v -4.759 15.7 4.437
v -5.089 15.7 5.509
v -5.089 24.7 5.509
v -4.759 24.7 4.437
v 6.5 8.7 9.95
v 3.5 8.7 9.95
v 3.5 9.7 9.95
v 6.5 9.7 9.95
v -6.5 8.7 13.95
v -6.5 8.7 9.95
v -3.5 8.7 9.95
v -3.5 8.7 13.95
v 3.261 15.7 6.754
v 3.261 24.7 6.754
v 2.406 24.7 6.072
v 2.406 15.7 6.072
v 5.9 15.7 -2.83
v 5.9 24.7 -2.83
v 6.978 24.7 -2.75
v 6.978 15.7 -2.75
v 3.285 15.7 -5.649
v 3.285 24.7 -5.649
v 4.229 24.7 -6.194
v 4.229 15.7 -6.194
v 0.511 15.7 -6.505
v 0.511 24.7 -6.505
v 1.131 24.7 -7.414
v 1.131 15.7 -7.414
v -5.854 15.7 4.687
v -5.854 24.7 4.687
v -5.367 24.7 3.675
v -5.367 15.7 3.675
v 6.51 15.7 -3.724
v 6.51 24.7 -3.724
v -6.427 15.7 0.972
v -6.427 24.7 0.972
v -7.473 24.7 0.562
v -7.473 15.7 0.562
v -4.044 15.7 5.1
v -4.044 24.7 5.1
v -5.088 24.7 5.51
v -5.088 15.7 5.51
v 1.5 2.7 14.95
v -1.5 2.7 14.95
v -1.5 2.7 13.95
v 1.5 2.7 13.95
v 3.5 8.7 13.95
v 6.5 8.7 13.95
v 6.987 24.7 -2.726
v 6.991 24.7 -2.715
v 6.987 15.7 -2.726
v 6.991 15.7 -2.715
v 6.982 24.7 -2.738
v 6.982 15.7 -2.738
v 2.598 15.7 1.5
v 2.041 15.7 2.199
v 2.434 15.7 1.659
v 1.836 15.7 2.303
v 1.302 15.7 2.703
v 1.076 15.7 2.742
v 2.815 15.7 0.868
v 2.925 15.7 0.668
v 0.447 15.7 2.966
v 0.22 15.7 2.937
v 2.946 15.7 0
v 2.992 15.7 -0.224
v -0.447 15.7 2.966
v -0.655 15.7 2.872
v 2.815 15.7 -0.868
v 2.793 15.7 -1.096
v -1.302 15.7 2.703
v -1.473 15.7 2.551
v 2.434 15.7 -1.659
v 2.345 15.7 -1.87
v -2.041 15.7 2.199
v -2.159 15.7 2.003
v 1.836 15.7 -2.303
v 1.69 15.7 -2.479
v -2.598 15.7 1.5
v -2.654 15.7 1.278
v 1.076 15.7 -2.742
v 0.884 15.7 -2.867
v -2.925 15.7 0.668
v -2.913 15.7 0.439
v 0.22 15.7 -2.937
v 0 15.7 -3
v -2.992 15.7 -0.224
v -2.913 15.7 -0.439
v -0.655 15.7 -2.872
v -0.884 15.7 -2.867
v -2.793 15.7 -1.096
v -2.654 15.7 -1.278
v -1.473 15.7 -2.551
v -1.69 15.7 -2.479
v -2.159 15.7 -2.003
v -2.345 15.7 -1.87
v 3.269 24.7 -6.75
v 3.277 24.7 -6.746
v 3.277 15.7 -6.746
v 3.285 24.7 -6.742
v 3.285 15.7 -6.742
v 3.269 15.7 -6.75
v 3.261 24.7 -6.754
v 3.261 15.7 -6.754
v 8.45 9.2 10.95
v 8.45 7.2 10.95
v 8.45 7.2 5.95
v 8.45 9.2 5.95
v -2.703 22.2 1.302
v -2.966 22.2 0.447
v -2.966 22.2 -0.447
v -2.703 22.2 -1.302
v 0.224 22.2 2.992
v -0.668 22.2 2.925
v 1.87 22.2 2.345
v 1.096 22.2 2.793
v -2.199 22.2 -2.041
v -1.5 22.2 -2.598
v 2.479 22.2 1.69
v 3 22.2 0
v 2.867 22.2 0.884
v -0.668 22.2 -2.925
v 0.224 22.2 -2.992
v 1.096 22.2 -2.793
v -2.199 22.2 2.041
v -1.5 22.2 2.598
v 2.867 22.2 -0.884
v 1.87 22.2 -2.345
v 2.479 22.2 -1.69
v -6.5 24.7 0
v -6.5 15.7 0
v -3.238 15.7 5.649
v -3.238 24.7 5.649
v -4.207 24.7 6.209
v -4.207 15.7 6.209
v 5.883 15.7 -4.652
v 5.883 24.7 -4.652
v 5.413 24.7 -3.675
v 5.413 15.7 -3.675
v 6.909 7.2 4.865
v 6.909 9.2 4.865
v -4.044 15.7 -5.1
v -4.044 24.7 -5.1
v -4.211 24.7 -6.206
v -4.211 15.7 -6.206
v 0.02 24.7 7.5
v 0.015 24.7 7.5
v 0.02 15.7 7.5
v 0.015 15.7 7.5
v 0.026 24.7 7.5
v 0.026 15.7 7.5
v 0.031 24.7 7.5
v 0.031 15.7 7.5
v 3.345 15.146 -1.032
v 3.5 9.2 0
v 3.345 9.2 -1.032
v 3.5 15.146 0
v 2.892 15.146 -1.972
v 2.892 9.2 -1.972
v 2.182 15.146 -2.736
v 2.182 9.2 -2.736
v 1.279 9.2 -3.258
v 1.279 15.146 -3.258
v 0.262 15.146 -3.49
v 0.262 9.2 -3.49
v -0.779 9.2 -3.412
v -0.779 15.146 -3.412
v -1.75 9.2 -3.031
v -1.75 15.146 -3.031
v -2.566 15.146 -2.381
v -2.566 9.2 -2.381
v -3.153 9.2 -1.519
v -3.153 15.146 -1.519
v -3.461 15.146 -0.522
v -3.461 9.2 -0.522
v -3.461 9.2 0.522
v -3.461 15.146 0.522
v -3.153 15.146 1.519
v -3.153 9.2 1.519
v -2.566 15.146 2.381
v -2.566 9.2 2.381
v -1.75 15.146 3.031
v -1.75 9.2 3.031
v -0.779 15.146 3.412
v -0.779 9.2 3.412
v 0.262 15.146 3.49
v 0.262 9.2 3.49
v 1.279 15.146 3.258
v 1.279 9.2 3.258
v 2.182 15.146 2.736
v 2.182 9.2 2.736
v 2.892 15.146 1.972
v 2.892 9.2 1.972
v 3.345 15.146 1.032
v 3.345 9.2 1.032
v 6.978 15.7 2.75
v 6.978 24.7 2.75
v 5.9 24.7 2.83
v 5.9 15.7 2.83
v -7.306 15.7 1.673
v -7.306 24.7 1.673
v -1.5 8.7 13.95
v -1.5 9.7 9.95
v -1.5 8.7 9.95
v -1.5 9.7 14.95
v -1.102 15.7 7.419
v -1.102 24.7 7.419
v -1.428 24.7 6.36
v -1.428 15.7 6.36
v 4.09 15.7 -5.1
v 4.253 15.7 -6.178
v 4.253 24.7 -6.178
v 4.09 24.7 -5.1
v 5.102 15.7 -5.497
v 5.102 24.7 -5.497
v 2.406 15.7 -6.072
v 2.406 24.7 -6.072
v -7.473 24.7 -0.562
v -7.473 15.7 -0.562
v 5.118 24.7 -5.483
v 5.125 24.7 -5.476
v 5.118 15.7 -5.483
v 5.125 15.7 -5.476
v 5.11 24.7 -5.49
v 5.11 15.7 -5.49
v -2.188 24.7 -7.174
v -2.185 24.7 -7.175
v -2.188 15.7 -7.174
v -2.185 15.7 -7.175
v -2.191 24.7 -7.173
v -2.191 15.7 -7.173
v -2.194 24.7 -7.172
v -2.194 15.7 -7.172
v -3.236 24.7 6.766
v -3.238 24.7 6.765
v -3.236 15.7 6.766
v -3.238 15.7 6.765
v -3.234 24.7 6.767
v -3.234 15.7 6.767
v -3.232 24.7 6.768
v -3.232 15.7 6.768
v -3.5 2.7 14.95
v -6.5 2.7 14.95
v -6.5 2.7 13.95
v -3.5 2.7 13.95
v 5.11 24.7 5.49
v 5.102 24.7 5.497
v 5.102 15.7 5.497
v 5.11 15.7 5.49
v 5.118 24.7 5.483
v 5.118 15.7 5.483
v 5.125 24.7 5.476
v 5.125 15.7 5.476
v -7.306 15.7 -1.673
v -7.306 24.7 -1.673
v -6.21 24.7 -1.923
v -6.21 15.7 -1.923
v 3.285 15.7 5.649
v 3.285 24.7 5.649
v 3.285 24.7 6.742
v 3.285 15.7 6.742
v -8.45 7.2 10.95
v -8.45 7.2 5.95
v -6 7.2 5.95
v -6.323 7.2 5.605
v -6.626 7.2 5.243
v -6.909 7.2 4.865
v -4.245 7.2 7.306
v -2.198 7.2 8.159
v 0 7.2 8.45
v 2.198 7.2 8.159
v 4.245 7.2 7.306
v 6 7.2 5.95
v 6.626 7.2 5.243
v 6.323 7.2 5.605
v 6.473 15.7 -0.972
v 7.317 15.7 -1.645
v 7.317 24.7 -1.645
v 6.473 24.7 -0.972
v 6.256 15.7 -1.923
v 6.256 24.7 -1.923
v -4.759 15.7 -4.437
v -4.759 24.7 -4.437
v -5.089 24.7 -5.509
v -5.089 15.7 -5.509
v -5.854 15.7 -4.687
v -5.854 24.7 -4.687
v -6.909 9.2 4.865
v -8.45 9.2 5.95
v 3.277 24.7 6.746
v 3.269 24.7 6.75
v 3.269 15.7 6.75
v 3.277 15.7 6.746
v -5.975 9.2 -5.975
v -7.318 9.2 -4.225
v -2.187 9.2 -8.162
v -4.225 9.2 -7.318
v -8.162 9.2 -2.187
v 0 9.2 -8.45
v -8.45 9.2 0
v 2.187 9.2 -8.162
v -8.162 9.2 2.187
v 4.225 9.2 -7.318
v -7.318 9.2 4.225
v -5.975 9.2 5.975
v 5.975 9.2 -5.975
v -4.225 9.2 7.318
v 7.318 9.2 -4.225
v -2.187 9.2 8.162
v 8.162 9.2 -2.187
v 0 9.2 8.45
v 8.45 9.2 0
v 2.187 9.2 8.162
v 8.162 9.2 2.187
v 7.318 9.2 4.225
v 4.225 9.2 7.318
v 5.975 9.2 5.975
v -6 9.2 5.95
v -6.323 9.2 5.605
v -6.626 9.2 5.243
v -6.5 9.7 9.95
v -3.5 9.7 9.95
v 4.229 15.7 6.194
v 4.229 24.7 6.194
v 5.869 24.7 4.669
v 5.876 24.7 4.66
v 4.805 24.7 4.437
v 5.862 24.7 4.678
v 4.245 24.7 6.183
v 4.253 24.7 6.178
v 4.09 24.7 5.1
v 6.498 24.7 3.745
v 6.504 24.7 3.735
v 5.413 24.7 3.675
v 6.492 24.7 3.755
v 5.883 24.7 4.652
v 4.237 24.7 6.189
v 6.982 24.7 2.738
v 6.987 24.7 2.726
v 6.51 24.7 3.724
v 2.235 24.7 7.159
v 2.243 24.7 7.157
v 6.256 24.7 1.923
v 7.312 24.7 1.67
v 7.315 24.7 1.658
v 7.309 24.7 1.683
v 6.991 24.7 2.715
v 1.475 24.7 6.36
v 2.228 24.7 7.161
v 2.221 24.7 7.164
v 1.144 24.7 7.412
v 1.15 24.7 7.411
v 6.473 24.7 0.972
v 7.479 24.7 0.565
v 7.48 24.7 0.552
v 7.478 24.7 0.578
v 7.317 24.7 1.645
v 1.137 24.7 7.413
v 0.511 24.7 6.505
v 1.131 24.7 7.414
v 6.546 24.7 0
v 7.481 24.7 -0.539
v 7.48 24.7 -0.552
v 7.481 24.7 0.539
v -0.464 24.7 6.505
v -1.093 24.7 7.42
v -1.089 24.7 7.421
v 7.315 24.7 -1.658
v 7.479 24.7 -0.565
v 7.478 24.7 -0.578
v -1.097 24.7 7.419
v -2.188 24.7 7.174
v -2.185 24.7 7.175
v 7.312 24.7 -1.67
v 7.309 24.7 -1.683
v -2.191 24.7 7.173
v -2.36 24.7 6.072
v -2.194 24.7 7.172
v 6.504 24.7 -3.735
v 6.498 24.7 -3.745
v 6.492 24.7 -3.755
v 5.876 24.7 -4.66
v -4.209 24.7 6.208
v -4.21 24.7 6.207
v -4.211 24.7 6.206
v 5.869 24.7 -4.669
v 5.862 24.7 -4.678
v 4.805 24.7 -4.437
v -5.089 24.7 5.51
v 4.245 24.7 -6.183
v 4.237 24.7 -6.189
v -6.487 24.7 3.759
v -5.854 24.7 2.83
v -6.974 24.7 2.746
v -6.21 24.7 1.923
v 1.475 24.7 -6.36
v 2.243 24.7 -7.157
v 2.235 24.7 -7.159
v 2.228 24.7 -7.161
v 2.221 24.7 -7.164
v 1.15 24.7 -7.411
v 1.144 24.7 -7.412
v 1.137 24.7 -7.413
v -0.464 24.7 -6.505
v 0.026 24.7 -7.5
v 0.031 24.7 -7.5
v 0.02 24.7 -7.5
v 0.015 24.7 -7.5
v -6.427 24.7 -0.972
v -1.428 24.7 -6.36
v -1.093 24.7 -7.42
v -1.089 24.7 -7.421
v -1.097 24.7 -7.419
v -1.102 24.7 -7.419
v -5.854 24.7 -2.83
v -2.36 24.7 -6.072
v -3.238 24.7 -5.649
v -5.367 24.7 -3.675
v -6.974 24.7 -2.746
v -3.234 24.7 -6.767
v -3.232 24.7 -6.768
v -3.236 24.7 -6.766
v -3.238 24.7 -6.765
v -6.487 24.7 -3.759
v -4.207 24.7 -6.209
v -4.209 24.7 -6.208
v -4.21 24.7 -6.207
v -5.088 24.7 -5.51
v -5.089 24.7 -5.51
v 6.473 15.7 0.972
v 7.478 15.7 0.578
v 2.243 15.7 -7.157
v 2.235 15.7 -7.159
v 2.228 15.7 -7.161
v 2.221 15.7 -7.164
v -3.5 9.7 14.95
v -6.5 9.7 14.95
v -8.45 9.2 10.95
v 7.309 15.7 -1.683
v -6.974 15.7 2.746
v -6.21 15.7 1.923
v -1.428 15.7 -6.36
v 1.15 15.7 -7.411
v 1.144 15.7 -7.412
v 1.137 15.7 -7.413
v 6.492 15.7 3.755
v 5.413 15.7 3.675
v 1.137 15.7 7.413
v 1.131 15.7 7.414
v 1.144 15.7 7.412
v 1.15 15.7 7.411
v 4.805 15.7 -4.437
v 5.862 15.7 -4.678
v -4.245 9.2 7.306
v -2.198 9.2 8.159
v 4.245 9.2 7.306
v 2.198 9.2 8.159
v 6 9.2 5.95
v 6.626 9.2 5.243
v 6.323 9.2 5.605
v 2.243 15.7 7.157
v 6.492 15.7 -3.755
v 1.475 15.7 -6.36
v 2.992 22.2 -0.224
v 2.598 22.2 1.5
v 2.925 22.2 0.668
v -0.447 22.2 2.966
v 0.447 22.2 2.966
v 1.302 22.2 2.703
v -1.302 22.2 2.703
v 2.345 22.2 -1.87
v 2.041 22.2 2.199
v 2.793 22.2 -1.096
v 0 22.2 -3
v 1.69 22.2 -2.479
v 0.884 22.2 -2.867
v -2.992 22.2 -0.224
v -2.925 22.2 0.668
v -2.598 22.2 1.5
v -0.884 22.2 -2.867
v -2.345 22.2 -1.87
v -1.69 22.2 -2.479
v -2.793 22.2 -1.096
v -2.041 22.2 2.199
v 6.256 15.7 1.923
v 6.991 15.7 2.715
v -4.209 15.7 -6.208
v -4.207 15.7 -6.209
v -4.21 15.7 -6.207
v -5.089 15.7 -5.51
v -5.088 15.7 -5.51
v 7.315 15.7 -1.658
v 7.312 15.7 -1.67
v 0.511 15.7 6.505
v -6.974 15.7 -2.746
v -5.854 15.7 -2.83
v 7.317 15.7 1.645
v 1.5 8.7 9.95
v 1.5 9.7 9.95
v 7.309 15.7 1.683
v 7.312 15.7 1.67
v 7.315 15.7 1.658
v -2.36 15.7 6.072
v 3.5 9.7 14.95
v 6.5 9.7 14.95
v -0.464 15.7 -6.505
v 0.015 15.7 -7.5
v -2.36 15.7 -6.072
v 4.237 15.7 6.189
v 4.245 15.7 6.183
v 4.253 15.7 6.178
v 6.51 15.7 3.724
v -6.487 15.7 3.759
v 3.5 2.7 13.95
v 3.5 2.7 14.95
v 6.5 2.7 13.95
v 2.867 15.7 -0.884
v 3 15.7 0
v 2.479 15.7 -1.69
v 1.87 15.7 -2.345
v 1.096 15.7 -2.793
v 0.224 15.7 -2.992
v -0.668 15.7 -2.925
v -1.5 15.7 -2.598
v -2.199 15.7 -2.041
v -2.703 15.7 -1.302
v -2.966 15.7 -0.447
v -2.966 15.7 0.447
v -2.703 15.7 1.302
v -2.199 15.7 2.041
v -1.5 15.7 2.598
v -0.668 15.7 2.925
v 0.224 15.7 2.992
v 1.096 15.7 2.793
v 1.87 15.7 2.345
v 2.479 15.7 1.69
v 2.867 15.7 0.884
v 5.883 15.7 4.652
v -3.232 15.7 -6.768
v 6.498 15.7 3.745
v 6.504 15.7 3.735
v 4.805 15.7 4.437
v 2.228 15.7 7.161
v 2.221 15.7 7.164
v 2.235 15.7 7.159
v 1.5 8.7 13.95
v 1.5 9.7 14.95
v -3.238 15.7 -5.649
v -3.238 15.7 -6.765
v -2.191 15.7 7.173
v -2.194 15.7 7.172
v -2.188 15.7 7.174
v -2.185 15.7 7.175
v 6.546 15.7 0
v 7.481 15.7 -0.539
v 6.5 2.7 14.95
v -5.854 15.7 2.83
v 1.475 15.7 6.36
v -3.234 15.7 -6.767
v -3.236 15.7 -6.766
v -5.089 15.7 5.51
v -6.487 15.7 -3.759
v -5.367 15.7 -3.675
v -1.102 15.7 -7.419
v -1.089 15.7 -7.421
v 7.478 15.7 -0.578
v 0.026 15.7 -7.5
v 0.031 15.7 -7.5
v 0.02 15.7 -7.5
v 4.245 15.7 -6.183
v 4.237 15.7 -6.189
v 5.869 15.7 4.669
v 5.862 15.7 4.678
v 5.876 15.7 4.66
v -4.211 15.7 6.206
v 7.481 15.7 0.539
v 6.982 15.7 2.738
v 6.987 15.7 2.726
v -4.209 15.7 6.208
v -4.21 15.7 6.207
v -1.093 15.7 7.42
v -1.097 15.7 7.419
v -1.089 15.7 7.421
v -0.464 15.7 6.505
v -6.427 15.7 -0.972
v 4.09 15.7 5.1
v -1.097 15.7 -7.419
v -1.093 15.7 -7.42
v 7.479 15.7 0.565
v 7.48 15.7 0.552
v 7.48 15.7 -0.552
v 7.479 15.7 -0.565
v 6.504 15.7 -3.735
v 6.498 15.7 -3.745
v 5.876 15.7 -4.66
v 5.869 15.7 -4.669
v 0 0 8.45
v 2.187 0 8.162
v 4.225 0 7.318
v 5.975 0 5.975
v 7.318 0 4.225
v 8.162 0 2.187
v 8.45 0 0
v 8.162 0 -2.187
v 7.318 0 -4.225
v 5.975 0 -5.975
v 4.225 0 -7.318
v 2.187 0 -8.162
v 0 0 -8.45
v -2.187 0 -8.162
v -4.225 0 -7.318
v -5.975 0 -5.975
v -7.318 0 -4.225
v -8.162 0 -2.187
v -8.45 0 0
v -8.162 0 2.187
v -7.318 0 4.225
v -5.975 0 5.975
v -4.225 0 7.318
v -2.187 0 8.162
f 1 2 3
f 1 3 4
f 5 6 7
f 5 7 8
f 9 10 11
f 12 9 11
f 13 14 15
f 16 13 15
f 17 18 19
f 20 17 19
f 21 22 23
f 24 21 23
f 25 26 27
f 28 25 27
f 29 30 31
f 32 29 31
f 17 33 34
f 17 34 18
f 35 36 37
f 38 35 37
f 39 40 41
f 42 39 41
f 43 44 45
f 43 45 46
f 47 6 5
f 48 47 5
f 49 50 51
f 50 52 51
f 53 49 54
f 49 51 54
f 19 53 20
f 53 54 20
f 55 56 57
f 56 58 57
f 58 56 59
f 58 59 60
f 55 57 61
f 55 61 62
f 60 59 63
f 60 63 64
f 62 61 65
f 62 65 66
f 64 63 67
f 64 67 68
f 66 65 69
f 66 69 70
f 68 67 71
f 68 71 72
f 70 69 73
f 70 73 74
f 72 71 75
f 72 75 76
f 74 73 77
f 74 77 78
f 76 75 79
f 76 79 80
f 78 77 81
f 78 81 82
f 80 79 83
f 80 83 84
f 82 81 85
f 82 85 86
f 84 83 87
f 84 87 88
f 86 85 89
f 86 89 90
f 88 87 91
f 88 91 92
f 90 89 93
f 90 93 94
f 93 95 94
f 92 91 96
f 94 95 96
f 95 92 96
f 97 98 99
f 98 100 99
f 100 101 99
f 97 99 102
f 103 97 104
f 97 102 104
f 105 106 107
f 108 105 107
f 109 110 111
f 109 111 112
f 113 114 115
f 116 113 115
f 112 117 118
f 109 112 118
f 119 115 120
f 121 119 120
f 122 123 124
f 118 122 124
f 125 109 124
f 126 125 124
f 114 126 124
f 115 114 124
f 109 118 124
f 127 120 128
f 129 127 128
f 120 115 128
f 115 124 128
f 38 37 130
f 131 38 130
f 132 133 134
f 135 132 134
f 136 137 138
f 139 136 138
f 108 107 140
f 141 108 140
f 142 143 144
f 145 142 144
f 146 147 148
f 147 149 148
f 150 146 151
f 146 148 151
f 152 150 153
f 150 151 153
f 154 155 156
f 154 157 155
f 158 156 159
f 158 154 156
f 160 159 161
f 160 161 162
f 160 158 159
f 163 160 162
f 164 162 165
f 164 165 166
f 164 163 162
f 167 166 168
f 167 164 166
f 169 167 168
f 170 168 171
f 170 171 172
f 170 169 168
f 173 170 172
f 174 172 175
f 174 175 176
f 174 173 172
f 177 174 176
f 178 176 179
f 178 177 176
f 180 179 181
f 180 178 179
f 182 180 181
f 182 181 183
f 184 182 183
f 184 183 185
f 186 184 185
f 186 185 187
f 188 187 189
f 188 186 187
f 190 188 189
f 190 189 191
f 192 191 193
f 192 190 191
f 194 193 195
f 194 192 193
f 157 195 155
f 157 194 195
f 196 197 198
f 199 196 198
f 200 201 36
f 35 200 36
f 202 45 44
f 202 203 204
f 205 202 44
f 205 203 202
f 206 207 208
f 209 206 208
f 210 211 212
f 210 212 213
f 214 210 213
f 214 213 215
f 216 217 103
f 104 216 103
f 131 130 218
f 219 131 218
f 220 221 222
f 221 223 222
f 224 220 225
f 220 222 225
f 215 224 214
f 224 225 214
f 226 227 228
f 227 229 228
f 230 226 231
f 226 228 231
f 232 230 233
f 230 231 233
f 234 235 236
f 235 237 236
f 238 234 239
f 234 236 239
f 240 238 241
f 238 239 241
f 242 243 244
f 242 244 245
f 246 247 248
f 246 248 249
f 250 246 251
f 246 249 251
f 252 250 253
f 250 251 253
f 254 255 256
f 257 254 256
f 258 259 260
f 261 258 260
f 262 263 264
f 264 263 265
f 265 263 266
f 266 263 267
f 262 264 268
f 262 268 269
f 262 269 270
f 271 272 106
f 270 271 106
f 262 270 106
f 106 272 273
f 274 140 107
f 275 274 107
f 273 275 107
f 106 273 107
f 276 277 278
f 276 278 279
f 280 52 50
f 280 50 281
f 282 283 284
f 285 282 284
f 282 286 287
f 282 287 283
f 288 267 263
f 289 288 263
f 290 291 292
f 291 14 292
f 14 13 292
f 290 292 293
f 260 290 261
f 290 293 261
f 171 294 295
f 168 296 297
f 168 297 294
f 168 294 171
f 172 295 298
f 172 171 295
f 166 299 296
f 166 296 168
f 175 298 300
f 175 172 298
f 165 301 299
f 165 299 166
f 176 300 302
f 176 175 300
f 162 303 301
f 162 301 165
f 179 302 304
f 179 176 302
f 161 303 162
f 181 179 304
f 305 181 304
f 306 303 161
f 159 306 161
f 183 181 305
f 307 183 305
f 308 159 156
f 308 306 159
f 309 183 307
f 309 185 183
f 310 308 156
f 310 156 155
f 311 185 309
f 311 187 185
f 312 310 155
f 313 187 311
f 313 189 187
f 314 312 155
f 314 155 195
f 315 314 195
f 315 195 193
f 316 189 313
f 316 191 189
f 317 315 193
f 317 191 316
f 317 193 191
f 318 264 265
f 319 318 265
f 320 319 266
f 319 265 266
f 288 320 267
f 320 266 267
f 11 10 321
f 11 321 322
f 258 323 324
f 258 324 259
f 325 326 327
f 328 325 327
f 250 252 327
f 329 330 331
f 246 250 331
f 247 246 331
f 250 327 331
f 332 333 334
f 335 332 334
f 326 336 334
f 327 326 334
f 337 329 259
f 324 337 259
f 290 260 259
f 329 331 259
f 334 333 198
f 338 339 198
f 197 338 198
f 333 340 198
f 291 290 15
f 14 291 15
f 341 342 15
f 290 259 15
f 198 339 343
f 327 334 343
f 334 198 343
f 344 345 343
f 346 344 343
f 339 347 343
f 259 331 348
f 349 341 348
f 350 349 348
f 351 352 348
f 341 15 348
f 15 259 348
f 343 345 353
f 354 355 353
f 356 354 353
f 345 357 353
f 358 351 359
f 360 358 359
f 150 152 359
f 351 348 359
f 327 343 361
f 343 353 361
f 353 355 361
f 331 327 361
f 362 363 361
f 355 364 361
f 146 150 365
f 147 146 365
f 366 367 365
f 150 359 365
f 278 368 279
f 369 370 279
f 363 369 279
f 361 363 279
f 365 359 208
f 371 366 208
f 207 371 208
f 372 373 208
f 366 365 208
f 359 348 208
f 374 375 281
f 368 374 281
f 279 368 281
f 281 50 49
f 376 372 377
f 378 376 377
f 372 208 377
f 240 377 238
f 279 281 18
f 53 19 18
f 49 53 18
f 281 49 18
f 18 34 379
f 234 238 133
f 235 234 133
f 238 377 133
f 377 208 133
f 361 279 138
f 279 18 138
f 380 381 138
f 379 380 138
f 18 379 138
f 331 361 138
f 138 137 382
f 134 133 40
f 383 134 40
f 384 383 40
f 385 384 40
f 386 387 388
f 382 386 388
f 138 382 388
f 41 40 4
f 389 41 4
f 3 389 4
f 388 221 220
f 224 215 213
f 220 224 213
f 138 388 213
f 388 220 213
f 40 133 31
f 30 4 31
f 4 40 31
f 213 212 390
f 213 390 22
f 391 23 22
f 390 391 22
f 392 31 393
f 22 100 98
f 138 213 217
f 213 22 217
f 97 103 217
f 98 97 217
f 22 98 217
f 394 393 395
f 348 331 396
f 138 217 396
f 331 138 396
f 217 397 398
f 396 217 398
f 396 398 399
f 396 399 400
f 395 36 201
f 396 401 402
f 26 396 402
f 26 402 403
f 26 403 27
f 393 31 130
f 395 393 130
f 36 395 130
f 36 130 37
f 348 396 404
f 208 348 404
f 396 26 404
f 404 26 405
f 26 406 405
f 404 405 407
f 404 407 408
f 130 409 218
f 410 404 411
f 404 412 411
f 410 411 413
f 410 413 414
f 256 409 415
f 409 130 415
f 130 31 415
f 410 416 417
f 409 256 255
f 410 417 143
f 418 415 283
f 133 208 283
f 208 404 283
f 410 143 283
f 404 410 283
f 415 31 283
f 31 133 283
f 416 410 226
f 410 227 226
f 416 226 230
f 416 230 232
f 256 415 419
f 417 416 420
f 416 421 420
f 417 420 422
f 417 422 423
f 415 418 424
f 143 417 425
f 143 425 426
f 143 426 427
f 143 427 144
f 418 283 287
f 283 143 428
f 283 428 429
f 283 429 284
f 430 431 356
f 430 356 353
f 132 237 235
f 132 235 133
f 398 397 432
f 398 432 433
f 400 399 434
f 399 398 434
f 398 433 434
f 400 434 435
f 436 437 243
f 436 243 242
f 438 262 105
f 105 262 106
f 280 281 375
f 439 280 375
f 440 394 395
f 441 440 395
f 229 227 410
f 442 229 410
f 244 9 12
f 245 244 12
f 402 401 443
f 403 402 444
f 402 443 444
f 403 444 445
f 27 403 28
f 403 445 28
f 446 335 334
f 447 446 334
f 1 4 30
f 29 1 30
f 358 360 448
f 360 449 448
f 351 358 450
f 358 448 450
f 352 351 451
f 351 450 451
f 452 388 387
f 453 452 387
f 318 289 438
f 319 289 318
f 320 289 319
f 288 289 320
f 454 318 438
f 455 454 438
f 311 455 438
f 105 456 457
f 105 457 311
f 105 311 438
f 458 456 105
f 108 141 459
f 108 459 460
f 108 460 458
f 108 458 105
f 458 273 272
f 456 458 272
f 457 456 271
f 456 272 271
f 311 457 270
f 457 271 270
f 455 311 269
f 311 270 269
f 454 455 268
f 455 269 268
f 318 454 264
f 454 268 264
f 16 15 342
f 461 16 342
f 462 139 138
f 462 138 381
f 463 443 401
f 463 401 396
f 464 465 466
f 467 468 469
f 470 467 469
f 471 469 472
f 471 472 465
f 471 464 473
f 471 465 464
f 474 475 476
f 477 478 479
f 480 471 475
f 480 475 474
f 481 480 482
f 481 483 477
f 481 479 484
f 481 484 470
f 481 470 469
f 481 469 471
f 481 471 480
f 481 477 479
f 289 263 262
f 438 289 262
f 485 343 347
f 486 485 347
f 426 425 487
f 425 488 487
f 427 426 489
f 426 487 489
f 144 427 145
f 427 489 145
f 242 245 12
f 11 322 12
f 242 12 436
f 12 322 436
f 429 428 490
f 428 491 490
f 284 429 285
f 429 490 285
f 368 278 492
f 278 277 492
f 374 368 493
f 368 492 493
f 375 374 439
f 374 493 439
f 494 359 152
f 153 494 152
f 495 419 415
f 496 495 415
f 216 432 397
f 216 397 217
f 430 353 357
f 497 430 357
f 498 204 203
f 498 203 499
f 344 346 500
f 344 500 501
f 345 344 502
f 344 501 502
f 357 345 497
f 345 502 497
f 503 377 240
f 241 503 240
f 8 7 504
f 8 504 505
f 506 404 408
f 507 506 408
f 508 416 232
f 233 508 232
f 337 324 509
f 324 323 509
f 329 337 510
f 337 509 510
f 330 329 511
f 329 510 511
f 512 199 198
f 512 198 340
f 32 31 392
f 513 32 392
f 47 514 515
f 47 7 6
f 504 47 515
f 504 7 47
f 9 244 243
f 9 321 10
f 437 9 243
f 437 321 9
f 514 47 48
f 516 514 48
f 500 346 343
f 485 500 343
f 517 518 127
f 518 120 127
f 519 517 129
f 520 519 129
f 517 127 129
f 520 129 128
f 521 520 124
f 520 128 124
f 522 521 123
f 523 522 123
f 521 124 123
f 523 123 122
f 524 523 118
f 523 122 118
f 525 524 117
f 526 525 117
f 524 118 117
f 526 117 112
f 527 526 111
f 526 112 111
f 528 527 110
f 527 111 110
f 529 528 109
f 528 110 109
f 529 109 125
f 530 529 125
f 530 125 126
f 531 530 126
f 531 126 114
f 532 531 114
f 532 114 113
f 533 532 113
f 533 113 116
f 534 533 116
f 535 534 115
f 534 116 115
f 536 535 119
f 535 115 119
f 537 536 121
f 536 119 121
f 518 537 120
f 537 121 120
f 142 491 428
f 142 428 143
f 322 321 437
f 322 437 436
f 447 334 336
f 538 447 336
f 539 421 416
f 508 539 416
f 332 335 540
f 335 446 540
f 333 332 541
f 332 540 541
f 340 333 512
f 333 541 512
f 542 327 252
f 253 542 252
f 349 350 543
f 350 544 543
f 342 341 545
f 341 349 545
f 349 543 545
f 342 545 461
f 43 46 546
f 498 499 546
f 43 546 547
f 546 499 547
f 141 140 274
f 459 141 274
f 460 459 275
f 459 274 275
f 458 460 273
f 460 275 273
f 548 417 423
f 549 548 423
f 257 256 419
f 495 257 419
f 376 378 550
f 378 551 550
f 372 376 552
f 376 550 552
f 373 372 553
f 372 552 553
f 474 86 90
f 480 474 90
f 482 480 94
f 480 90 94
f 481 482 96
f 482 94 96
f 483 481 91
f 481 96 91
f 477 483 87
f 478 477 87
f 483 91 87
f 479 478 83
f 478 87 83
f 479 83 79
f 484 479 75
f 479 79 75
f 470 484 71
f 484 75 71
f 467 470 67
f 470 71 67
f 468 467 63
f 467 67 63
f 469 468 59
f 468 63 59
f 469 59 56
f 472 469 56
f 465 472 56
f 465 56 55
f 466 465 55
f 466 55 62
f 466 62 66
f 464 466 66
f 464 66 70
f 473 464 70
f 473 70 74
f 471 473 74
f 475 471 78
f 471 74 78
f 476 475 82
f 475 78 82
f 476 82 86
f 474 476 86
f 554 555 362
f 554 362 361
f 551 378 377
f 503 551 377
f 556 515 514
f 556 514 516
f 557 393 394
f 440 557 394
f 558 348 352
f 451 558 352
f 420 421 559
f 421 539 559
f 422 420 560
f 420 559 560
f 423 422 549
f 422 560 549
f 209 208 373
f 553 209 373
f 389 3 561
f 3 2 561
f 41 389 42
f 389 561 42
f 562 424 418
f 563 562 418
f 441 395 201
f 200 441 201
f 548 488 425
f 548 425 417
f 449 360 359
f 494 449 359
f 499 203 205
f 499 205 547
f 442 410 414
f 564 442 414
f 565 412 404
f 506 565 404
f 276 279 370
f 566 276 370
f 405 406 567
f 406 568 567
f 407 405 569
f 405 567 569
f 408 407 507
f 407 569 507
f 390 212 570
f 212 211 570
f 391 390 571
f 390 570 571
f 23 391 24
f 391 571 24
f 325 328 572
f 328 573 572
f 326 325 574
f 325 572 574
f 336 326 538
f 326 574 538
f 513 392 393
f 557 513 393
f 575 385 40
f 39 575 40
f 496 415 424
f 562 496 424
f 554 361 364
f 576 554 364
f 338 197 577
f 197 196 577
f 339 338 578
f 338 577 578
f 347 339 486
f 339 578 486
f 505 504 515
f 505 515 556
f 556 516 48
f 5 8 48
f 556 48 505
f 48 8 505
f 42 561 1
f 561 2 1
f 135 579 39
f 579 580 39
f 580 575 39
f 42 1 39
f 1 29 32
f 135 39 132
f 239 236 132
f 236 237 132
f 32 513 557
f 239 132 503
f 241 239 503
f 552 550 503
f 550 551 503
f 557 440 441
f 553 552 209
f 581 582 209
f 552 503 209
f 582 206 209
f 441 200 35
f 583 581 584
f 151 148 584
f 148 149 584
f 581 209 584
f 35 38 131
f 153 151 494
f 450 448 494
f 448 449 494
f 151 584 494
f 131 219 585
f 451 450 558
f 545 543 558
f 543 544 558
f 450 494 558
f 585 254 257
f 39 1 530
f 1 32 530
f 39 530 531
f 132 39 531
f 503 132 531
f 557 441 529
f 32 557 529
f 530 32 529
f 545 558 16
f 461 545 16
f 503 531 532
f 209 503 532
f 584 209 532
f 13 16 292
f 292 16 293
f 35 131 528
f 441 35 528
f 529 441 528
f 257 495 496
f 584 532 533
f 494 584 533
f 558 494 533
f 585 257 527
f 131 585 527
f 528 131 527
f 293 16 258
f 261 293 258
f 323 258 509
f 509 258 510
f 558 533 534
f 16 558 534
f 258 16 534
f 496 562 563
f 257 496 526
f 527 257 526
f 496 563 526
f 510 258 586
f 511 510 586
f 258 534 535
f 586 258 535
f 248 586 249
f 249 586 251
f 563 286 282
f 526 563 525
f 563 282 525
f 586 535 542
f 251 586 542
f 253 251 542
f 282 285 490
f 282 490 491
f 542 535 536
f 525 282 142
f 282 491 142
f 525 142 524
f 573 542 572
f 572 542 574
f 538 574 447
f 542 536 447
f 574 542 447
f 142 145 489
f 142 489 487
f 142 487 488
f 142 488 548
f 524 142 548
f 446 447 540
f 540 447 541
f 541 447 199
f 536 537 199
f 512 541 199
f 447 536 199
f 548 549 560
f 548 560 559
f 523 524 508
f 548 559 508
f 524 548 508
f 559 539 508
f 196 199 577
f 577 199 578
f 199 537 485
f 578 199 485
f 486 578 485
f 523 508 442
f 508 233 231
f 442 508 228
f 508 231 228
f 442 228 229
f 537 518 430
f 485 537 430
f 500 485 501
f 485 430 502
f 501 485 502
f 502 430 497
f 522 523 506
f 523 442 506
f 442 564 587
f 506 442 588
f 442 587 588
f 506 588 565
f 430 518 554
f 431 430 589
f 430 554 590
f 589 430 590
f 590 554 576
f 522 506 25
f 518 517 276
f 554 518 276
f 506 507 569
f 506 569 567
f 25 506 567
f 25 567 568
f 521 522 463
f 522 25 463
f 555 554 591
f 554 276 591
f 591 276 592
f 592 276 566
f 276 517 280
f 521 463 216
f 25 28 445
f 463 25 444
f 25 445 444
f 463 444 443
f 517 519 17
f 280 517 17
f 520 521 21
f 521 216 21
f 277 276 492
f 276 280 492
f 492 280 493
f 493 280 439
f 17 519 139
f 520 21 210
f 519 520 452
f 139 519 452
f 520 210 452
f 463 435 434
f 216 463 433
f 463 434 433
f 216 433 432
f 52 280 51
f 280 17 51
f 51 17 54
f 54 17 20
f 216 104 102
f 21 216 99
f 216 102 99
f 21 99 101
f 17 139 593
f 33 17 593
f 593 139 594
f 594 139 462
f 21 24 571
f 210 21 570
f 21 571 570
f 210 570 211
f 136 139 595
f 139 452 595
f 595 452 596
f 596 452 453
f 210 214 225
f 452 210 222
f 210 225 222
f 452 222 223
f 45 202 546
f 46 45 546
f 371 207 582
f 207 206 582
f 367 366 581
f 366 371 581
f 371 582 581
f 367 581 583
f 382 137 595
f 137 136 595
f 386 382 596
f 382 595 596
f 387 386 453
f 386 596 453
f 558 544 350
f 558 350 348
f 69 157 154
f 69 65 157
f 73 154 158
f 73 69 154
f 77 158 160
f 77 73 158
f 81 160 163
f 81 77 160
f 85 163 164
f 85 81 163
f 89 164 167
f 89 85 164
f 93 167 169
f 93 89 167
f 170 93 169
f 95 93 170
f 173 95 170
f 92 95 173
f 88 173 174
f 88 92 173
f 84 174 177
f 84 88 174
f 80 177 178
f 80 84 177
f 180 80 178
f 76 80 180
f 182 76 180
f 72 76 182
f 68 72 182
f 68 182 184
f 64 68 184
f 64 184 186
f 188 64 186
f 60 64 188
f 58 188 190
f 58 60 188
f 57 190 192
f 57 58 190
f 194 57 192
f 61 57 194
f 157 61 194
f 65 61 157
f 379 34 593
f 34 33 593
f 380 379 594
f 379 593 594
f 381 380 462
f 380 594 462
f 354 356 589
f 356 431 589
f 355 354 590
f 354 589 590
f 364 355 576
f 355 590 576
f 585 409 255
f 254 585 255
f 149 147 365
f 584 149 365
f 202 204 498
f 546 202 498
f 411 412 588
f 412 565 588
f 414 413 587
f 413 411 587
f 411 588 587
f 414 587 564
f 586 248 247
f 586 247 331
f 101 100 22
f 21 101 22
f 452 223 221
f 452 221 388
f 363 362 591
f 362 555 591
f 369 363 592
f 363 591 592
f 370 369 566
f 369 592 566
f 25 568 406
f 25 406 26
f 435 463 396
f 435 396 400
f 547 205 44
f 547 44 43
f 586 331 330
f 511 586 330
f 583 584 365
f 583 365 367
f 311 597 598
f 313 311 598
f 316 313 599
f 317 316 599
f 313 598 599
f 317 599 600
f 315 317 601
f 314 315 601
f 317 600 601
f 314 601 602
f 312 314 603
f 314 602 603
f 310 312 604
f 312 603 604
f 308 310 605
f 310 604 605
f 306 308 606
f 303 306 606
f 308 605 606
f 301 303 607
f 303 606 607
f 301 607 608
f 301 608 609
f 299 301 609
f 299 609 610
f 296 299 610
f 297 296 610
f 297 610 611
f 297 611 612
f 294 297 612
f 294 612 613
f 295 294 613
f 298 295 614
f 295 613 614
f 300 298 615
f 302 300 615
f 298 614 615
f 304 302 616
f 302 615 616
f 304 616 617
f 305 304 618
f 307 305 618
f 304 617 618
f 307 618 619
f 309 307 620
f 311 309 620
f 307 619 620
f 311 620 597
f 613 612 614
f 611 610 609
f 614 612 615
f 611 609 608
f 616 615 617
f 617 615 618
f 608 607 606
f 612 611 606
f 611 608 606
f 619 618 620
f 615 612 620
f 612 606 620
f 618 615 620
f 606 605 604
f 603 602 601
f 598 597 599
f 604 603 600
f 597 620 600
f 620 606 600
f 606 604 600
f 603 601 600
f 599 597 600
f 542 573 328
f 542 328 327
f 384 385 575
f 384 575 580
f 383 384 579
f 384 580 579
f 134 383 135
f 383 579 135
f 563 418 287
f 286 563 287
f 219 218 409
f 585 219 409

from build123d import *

# Parameters (mm, degrees)
SKETCH1_R           = 8.45
BOSS_EXTRUDE1_DEPTH = 9.2
BOSS_EXTRUDE2_START = 7.2
SKETCH1_3_W         = 3
SKETCH1_3_H         = 1
BOSS_EXTRUDE2_DEPTH = 2
BOSS_EXTRUDE3_START = 8.7
SKETCH1_4_W         = 3
SKETCH1_4_H         = 1
SKETCH1_4_H_2       = 4
BOSS_EXTRUDE3_DEPTH = 1
SKETCH5_R           = 3
BOSS_EXTRUDE4_DEPTH = 6.5
SKETCH6_W           = 3
SKETCH6_H           = 1
BOSS_EXTRUDE5_DEPTH = 6
CUT_EXTRUDE2_DEPTH  = 9
CIRPATTERN2_COUNT   = 42


# Read off the part's stored shape, not the designer's step: M7x1.0 Machine Threads Stud1
with BuildPart() as part:
    # Sketch1 → Boss-Extrude1 (new body)
    with BuildSketch(Plane(origin=(0, 0, 0), x_dir=(1, 0, 0), z_dir=(0, 1, 0))):
        with Locations(Location((0, 0, 0), (0, 0, 270))):
            Circle(SKETCH1_R)
    extrude(amount=BOSS_EXTRUDE1_DEPTH)

    # M7x1.0 Machine Threads Stud1 outline → M7x1.0 Machine Threads Stud1 (revolve)
    with BuildSketch(Plane.XY):
        Polygon((2.9455, 15.7), (0, 15.7), (0, 9.2), (3.5, 9.2), (3.5, 15.1455), align=None)
    revolve(axis=Axis((0, 0, 0), (0, 1, 0)))

    # Sketch5 → Boss-Extrude4 (add)
    with BuildSketch(Plane(origin=(0, 15.7, 0), x_dir=(1, 0, 0), z_dir=(0, 1, 0))):
        with Locations(Location((0, 0, 0), (0, 0, 90))):
            Circle(SKETCH5_R)
    extrude(amount=BOSS_EXTRUDE4_DEPTH)


with BuildPart() as body_2:
    # Sketch1<3> → Boss-Extrude2 (new body)
    with BuildSketch(Plane(origin=(0, 0, 0), x_dir=(1, 0, 0), z_dir=(0, 1, 0)).offset(BOSS_EXTRUDE2_START)):
        with BuildLine():
            Line((-6.909038706, -4.864944414), (-8.45, -5.95))
            Line((-8.45, -5.95), (-6, -5.95))
            ThreePointArc((-6, -5.95), (-6.477280022, -5.426540658), (-6.909038706, -4.864944414))
        make_face()
        with BuildLine():
            Line((-6, -5.95), (-8.45, -5.95))
            Line((-8.45, -5.95), (-8.45, -10.95))
            Line((-8.45, -10.95), (-6.5, -10.95))
            Line((-6.5, -10.95), (-6.5, -9.95))
            Line((-6.5, -9.95), (-3.5, -9.95))
            Line((-3.5, -9.95), (-3.5, -10.95))
            Line((-3.5, -10.95), (-1.5, -10.95))
            Line((-1.5, -10.95), (-1.5, -9.95))
            Line((-1.5, -9.95), (1.5, -9.95))
            Line((1.5, -9.95), (1.5, -10.95))
            Line((1.5, -10.95), (3.5, -10.95))
            Line((3.5, -10.95), (3.5, -9.95))
            Line((3.5, -9.95), (6.5, -9.95))
            Line((6.5, -9.95), (6.5, -10.95))
            Line((6.5, -10.95), (8.45, -10.95))
            Line((8.45, -10.95), (8.45, -5.95))
            Line((8.45, -5.95), (6, -5.95))
            ThreePointArc((6, -5.95), (0, -8.45), (-6, -5.95))
        make_face()
        with BuildLine():
            ThreePointArc((6.909038706, -4.864944414), (6.477280022, -5.426540658), (6, -5.95))
            Line((6, -5.95), (8.45, -5.95))
            Line((8.45, -5.95), (6.909038706, -4.864944414))
        make_face()
        with Locations((-5, -10.45)):
            Rectangle(SKETCH1_3_W, SKETCH1_3_H)
        with Locations((0, -10.45)):
            Rectangle(SKETCH1_3_W, SKETCH1_3_H)
        with Locations((5, -10.45)):
            Rectangle(SKETCH1_3_W, SKETCH1_3_H)
    extrude(amount=BOSS_EXTRUDE2_DEPTH)


with BuildPart() as body_3:
    # Sketch1<4> → Boss-Extrude3 (new body)
    with BuildSketch(Plane(origin=(0, 0, 0), x_dir=(1, 0, 0), z_dir=(0, 1, 0)).offset(BOSS_EXTRUDE3_START)):
        with Locations((-5, -10.45)):
            Rectangle(SKETCH1_4_W, SKETCH1_4_H)
        with Locations((-5, -12.95)):
            Rectangle(SKETCH1_4_W, SKETCH1_4_H_2)
        with Locations((0, -10.45)):
            Rectangle(SKETCH1_4_W, SKETCH1_4_H)
        with Locations((0, -12.95)):
            Rectangle(SKETCH1_4_W, SKETCH1_4_H_2)
        with Locations((5, -10.45)):
            Rectangle(SKETCH1_4_W, SKETCH1_4_H)
        with Locations((5, -12.95)):
            Rectangle(SKETCH1_4_W, SKETCH1_4_H_2)
    extrude(amount=BOSS_EXTRUDE3_DEPTH)

    # Sketch6 → Boss-Extrude5 (add)
    with BuildSketch(Plane.XZ.offset(-8.7)):
        with Locations((-5, 14.45)):
            Rectangle(SKETCH6_W, SKETCH6_H)
        with Locations((0, 14.45)):
            Rectangle(SKETCH6_W, SKETCH6_H)
        with Locations((5, 14.45)):
            Rectangle(SKETCH6_W, SKETCH6_H)
    extrude(amount=BOSS_EXTRUDE5_DEPTH)


with BuildPart() as body_4:
    # Sketch8 → Revolve1 (revolve)
    with BuildSketch(Plane.XY, mode=Mode.PRIVATE) as revolve1_sk:
        Polygon((-7.5, 15.7), (-3, 15.7), (-3, 22.2), (0, 22.2), (0, 24.7), (-7.5, 24.7), align=None)
    revolve(revolve1_sk.sketch.rotate(Axis((0, 22.2, 0), (0, 1, 0)), 180), axis=Axis((0, 22.2, 0), (0, 1, 0)))

    # Sketch9 → Cut-Extrude2 (cut)
    with BuildSketch(Plane(origin=(0, 24.7, 0), x_dir=(1, 0, 0), z_dir=(0, 1, 0))):
        Polygon((-6.5, 0), (-8, 0.866025404), (-8, -0.866025404), align=None)
    cut_extrude2 = extrude(amount=-CUT_EXTRUDE2_DEPTH, mode=Mode.SUBTRACT)

    # CirPattern2: Cut-Extrude2 ×42 about axis
    cirpattern2_axis = Axis((0.023137555, 0, 0), (0, 1, 0))
    for i in range(1, CIRPATTERN2_COUNT):
        add(cut_extrude2.rotate(cirpattern2_axis, i * 360 / CIRPATTERN2_COUNT), mode=Mode.SUBTRACT)


solid = Compound([part.part, body_2.part, body_3.part, body_4.part])
